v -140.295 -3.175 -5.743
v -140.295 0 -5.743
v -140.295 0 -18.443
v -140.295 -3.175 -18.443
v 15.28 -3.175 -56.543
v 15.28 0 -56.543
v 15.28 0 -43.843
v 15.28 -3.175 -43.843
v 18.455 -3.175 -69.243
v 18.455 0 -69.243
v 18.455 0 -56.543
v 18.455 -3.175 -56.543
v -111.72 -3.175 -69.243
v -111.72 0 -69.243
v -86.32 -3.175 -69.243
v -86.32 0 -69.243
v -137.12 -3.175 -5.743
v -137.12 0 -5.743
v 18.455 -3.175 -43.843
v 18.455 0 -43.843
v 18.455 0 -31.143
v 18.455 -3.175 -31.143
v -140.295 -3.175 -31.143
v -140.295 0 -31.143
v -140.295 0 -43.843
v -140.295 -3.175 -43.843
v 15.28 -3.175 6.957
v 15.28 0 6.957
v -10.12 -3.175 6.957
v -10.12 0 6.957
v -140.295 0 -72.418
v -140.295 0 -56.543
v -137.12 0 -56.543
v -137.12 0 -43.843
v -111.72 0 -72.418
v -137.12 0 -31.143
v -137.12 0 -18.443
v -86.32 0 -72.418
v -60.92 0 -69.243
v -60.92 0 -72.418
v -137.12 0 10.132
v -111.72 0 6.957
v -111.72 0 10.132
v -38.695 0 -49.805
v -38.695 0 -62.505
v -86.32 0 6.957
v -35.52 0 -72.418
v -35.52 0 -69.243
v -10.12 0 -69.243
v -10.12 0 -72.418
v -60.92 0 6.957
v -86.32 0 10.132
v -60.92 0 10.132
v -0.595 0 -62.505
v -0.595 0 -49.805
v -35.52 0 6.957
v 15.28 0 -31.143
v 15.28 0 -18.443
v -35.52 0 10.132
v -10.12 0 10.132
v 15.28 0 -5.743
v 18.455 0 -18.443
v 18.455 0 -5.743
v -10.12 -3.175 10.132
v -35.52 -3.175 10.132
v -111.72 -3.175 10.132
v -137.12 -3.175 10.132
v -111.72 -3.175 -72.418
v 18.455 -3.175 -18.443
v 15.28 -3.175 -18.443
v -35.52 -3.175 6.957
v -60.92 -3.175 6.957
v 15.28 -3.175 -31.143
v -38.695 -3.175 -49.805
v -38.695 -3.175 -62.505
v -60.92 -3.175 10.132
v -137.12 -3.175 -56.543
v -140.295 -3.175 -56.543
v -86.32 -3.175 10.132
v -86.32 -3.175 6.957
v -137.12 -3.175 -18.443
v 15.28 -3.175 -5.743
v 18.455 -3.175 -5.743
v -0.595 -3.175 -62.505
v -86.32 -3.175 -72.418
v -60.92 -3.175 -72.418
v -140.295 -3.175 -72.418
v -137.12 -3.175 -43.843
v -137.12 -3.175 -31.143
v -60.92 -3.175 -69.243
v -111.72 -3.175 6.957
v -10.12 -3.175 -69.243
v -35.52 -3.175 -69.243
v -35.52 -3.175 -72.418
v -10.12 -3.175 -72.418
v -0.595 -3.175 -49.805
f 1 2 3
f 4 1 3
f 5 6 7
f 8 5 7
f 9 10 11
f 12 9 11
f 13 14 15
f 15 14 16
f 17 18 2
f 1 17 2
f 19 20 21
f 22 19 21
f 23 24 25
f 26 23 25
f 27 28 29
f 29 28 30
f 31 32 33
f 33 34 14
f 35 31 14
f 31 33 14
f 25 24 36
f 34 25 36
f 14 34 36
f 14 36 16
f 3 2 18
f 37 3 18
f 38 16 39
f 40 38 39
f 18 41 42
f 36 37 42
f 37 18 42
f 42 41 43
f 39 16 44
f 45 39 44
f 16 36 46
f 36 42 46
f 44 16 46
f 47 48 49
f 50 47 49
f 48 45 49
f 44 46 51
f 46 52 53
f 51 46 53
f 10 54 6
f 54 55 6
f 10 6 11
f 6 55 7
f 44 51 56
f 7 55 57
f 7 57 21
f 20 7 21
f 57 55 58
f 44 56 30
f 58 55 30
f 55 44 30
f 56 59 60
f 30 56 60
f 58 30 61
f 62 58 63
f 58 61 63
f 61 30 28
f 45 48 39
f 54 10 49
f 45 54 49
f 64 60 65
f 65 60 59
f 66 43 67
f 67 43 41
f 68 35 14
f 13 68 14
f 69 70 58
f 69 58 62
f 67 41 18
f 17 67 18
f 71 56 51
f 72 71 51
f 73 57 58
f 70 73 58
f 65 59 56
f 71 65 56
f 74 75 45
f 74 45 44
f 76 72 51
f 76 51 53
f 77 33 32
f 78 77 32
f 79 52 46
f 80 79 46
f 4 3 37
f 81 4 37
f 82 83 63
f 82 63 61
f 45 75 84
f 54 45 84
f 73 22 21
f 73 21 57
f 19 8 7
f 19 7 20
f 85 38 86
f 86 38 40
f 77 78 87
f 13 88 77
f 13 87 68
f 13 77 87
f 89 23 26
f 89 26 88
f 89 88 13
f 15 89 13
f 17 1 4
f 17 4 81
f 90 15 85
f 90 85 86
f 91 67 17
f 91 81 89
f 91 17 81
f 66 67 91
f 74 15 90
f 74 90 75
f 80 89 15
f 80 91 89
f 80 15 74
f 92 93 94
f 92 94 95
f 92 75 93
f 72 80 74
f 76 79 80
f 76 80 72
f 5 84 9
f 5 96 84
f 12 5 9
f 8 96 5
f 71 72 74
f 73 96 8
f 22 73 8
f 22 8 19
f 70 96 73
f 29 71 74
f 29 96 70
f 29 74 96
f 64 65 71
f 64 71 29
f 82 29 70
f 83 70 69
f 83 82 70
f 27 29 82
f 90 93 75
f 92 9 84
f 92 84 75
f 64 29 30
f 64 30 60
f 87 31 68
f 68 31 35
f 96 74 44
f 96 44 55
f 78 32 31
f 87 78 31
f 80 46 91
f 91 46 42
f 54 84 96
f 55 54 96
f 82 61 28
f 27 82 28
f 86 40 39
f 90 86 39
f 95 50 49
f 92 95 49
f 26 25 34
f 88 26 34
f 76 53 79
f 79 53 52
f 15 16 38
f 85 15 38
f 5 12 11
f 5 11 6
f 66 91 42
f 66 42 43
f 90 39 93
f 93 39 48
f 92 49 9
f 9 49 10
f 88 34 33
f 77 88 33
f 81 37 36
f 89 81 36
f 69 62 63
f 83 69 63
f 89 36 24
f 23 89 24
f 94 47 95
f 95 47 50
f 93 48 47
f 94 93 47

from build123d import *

# Parameters (mm, degrees)
F1_DEPTH = 3.175
F2_W     = 38.1
F2_H     = 12.7
F3_DEPTH = 25.4


# Not quite as in the source:
# - a length typed as a fraction of an inch, garbled in the dataset ("3 / 203.2 mm" for 3/8 in), is restored


with BuildPart() as f1:
    # F0 (on Front) → F1 (new body)
    with BuildSketch(Plane.XZ):
        Polygon((15.2796131081, -5.7429333596), (15.2796131081, 6.9570666404), (-10.1203868919, 6.9570666404), (-10.1203868919, 10.1320666404), (-35.5203868919, 10.1320666404), (-35.5203868919, 6.9570666404), (-60.9203868919, 6.9570666404), (-60.9203868919, 10.1320666404), (-86.3203868919, 10.1320666404), (-86.3203868919, 6.9570666404), (-111.7203868919, 6.9570666404), (-111.7203868919, 10.1320666404), (-137.1203868919, 10.1320666404), (-137.1203868919, 6.9570666404), (-137.1203868919, -5.7429333596), (-140.2953868919, -5.7429333596), (-140.2953868919, -18.4429333596), (-137.1203868919, -18.4429333596), (-137.1203868919, -31.1429333596), (-140.2953868919, -31.1429333596), (-140.2953868919, -43.8429333596), (-137.1203868919, -43.8429333596), (-137.1203868919, -56.5429333596), (-140.2953868919, -56.5429333596), (-140.2953868919, -69.2429333596), (-140.2953868919, -72.4179333596), (-137.1203868919, -72.4179333596), (-111.7203868919, -72.4179333596), (-111.7203868919, -69.2429333596), (-86.3203868919, -69.2429333596), (-86.3203868919, -72.4179333596), (-60.9203868919, -72.4179333596), (-60.9203868919, -69.2429333596), (-35.5203868919, -69.2429333596), (-35.5203868919, -72.4179333596), (-10.1203868919, -72.4179333596), (-10.1203868919, -69.2429333596), (15.2796131081, -69.2429333596), (18.4546131081, -69.2429333596), (18.4546131081, -56.5429333596), (15.2796131081, -56.5429333596), (15.2796131081, -43.8429333596), (18.4546131081, -43.8429333596), (18.4546131081, -31.1429333596), (15.2796131081, -31.1429333596), (15.2796131081, -18.4429333596), (18.4546131081, -18.4429333596), (18.4546131081, -5.7429333596), align=None)
    extrude(amount=F1_DEPTH)

    # F2 (on face) → F3 (cut)
    with BuildSketch(Plane.XZ.offset(3.175)):
        with Locations((-19.6453868919, -56.1550986022)):
            Rectangle(F2_W, F2_H)
    extrude(amount=-F3_DEPTH, mode=Mode.SUBTRACT)


solid = f1.part
